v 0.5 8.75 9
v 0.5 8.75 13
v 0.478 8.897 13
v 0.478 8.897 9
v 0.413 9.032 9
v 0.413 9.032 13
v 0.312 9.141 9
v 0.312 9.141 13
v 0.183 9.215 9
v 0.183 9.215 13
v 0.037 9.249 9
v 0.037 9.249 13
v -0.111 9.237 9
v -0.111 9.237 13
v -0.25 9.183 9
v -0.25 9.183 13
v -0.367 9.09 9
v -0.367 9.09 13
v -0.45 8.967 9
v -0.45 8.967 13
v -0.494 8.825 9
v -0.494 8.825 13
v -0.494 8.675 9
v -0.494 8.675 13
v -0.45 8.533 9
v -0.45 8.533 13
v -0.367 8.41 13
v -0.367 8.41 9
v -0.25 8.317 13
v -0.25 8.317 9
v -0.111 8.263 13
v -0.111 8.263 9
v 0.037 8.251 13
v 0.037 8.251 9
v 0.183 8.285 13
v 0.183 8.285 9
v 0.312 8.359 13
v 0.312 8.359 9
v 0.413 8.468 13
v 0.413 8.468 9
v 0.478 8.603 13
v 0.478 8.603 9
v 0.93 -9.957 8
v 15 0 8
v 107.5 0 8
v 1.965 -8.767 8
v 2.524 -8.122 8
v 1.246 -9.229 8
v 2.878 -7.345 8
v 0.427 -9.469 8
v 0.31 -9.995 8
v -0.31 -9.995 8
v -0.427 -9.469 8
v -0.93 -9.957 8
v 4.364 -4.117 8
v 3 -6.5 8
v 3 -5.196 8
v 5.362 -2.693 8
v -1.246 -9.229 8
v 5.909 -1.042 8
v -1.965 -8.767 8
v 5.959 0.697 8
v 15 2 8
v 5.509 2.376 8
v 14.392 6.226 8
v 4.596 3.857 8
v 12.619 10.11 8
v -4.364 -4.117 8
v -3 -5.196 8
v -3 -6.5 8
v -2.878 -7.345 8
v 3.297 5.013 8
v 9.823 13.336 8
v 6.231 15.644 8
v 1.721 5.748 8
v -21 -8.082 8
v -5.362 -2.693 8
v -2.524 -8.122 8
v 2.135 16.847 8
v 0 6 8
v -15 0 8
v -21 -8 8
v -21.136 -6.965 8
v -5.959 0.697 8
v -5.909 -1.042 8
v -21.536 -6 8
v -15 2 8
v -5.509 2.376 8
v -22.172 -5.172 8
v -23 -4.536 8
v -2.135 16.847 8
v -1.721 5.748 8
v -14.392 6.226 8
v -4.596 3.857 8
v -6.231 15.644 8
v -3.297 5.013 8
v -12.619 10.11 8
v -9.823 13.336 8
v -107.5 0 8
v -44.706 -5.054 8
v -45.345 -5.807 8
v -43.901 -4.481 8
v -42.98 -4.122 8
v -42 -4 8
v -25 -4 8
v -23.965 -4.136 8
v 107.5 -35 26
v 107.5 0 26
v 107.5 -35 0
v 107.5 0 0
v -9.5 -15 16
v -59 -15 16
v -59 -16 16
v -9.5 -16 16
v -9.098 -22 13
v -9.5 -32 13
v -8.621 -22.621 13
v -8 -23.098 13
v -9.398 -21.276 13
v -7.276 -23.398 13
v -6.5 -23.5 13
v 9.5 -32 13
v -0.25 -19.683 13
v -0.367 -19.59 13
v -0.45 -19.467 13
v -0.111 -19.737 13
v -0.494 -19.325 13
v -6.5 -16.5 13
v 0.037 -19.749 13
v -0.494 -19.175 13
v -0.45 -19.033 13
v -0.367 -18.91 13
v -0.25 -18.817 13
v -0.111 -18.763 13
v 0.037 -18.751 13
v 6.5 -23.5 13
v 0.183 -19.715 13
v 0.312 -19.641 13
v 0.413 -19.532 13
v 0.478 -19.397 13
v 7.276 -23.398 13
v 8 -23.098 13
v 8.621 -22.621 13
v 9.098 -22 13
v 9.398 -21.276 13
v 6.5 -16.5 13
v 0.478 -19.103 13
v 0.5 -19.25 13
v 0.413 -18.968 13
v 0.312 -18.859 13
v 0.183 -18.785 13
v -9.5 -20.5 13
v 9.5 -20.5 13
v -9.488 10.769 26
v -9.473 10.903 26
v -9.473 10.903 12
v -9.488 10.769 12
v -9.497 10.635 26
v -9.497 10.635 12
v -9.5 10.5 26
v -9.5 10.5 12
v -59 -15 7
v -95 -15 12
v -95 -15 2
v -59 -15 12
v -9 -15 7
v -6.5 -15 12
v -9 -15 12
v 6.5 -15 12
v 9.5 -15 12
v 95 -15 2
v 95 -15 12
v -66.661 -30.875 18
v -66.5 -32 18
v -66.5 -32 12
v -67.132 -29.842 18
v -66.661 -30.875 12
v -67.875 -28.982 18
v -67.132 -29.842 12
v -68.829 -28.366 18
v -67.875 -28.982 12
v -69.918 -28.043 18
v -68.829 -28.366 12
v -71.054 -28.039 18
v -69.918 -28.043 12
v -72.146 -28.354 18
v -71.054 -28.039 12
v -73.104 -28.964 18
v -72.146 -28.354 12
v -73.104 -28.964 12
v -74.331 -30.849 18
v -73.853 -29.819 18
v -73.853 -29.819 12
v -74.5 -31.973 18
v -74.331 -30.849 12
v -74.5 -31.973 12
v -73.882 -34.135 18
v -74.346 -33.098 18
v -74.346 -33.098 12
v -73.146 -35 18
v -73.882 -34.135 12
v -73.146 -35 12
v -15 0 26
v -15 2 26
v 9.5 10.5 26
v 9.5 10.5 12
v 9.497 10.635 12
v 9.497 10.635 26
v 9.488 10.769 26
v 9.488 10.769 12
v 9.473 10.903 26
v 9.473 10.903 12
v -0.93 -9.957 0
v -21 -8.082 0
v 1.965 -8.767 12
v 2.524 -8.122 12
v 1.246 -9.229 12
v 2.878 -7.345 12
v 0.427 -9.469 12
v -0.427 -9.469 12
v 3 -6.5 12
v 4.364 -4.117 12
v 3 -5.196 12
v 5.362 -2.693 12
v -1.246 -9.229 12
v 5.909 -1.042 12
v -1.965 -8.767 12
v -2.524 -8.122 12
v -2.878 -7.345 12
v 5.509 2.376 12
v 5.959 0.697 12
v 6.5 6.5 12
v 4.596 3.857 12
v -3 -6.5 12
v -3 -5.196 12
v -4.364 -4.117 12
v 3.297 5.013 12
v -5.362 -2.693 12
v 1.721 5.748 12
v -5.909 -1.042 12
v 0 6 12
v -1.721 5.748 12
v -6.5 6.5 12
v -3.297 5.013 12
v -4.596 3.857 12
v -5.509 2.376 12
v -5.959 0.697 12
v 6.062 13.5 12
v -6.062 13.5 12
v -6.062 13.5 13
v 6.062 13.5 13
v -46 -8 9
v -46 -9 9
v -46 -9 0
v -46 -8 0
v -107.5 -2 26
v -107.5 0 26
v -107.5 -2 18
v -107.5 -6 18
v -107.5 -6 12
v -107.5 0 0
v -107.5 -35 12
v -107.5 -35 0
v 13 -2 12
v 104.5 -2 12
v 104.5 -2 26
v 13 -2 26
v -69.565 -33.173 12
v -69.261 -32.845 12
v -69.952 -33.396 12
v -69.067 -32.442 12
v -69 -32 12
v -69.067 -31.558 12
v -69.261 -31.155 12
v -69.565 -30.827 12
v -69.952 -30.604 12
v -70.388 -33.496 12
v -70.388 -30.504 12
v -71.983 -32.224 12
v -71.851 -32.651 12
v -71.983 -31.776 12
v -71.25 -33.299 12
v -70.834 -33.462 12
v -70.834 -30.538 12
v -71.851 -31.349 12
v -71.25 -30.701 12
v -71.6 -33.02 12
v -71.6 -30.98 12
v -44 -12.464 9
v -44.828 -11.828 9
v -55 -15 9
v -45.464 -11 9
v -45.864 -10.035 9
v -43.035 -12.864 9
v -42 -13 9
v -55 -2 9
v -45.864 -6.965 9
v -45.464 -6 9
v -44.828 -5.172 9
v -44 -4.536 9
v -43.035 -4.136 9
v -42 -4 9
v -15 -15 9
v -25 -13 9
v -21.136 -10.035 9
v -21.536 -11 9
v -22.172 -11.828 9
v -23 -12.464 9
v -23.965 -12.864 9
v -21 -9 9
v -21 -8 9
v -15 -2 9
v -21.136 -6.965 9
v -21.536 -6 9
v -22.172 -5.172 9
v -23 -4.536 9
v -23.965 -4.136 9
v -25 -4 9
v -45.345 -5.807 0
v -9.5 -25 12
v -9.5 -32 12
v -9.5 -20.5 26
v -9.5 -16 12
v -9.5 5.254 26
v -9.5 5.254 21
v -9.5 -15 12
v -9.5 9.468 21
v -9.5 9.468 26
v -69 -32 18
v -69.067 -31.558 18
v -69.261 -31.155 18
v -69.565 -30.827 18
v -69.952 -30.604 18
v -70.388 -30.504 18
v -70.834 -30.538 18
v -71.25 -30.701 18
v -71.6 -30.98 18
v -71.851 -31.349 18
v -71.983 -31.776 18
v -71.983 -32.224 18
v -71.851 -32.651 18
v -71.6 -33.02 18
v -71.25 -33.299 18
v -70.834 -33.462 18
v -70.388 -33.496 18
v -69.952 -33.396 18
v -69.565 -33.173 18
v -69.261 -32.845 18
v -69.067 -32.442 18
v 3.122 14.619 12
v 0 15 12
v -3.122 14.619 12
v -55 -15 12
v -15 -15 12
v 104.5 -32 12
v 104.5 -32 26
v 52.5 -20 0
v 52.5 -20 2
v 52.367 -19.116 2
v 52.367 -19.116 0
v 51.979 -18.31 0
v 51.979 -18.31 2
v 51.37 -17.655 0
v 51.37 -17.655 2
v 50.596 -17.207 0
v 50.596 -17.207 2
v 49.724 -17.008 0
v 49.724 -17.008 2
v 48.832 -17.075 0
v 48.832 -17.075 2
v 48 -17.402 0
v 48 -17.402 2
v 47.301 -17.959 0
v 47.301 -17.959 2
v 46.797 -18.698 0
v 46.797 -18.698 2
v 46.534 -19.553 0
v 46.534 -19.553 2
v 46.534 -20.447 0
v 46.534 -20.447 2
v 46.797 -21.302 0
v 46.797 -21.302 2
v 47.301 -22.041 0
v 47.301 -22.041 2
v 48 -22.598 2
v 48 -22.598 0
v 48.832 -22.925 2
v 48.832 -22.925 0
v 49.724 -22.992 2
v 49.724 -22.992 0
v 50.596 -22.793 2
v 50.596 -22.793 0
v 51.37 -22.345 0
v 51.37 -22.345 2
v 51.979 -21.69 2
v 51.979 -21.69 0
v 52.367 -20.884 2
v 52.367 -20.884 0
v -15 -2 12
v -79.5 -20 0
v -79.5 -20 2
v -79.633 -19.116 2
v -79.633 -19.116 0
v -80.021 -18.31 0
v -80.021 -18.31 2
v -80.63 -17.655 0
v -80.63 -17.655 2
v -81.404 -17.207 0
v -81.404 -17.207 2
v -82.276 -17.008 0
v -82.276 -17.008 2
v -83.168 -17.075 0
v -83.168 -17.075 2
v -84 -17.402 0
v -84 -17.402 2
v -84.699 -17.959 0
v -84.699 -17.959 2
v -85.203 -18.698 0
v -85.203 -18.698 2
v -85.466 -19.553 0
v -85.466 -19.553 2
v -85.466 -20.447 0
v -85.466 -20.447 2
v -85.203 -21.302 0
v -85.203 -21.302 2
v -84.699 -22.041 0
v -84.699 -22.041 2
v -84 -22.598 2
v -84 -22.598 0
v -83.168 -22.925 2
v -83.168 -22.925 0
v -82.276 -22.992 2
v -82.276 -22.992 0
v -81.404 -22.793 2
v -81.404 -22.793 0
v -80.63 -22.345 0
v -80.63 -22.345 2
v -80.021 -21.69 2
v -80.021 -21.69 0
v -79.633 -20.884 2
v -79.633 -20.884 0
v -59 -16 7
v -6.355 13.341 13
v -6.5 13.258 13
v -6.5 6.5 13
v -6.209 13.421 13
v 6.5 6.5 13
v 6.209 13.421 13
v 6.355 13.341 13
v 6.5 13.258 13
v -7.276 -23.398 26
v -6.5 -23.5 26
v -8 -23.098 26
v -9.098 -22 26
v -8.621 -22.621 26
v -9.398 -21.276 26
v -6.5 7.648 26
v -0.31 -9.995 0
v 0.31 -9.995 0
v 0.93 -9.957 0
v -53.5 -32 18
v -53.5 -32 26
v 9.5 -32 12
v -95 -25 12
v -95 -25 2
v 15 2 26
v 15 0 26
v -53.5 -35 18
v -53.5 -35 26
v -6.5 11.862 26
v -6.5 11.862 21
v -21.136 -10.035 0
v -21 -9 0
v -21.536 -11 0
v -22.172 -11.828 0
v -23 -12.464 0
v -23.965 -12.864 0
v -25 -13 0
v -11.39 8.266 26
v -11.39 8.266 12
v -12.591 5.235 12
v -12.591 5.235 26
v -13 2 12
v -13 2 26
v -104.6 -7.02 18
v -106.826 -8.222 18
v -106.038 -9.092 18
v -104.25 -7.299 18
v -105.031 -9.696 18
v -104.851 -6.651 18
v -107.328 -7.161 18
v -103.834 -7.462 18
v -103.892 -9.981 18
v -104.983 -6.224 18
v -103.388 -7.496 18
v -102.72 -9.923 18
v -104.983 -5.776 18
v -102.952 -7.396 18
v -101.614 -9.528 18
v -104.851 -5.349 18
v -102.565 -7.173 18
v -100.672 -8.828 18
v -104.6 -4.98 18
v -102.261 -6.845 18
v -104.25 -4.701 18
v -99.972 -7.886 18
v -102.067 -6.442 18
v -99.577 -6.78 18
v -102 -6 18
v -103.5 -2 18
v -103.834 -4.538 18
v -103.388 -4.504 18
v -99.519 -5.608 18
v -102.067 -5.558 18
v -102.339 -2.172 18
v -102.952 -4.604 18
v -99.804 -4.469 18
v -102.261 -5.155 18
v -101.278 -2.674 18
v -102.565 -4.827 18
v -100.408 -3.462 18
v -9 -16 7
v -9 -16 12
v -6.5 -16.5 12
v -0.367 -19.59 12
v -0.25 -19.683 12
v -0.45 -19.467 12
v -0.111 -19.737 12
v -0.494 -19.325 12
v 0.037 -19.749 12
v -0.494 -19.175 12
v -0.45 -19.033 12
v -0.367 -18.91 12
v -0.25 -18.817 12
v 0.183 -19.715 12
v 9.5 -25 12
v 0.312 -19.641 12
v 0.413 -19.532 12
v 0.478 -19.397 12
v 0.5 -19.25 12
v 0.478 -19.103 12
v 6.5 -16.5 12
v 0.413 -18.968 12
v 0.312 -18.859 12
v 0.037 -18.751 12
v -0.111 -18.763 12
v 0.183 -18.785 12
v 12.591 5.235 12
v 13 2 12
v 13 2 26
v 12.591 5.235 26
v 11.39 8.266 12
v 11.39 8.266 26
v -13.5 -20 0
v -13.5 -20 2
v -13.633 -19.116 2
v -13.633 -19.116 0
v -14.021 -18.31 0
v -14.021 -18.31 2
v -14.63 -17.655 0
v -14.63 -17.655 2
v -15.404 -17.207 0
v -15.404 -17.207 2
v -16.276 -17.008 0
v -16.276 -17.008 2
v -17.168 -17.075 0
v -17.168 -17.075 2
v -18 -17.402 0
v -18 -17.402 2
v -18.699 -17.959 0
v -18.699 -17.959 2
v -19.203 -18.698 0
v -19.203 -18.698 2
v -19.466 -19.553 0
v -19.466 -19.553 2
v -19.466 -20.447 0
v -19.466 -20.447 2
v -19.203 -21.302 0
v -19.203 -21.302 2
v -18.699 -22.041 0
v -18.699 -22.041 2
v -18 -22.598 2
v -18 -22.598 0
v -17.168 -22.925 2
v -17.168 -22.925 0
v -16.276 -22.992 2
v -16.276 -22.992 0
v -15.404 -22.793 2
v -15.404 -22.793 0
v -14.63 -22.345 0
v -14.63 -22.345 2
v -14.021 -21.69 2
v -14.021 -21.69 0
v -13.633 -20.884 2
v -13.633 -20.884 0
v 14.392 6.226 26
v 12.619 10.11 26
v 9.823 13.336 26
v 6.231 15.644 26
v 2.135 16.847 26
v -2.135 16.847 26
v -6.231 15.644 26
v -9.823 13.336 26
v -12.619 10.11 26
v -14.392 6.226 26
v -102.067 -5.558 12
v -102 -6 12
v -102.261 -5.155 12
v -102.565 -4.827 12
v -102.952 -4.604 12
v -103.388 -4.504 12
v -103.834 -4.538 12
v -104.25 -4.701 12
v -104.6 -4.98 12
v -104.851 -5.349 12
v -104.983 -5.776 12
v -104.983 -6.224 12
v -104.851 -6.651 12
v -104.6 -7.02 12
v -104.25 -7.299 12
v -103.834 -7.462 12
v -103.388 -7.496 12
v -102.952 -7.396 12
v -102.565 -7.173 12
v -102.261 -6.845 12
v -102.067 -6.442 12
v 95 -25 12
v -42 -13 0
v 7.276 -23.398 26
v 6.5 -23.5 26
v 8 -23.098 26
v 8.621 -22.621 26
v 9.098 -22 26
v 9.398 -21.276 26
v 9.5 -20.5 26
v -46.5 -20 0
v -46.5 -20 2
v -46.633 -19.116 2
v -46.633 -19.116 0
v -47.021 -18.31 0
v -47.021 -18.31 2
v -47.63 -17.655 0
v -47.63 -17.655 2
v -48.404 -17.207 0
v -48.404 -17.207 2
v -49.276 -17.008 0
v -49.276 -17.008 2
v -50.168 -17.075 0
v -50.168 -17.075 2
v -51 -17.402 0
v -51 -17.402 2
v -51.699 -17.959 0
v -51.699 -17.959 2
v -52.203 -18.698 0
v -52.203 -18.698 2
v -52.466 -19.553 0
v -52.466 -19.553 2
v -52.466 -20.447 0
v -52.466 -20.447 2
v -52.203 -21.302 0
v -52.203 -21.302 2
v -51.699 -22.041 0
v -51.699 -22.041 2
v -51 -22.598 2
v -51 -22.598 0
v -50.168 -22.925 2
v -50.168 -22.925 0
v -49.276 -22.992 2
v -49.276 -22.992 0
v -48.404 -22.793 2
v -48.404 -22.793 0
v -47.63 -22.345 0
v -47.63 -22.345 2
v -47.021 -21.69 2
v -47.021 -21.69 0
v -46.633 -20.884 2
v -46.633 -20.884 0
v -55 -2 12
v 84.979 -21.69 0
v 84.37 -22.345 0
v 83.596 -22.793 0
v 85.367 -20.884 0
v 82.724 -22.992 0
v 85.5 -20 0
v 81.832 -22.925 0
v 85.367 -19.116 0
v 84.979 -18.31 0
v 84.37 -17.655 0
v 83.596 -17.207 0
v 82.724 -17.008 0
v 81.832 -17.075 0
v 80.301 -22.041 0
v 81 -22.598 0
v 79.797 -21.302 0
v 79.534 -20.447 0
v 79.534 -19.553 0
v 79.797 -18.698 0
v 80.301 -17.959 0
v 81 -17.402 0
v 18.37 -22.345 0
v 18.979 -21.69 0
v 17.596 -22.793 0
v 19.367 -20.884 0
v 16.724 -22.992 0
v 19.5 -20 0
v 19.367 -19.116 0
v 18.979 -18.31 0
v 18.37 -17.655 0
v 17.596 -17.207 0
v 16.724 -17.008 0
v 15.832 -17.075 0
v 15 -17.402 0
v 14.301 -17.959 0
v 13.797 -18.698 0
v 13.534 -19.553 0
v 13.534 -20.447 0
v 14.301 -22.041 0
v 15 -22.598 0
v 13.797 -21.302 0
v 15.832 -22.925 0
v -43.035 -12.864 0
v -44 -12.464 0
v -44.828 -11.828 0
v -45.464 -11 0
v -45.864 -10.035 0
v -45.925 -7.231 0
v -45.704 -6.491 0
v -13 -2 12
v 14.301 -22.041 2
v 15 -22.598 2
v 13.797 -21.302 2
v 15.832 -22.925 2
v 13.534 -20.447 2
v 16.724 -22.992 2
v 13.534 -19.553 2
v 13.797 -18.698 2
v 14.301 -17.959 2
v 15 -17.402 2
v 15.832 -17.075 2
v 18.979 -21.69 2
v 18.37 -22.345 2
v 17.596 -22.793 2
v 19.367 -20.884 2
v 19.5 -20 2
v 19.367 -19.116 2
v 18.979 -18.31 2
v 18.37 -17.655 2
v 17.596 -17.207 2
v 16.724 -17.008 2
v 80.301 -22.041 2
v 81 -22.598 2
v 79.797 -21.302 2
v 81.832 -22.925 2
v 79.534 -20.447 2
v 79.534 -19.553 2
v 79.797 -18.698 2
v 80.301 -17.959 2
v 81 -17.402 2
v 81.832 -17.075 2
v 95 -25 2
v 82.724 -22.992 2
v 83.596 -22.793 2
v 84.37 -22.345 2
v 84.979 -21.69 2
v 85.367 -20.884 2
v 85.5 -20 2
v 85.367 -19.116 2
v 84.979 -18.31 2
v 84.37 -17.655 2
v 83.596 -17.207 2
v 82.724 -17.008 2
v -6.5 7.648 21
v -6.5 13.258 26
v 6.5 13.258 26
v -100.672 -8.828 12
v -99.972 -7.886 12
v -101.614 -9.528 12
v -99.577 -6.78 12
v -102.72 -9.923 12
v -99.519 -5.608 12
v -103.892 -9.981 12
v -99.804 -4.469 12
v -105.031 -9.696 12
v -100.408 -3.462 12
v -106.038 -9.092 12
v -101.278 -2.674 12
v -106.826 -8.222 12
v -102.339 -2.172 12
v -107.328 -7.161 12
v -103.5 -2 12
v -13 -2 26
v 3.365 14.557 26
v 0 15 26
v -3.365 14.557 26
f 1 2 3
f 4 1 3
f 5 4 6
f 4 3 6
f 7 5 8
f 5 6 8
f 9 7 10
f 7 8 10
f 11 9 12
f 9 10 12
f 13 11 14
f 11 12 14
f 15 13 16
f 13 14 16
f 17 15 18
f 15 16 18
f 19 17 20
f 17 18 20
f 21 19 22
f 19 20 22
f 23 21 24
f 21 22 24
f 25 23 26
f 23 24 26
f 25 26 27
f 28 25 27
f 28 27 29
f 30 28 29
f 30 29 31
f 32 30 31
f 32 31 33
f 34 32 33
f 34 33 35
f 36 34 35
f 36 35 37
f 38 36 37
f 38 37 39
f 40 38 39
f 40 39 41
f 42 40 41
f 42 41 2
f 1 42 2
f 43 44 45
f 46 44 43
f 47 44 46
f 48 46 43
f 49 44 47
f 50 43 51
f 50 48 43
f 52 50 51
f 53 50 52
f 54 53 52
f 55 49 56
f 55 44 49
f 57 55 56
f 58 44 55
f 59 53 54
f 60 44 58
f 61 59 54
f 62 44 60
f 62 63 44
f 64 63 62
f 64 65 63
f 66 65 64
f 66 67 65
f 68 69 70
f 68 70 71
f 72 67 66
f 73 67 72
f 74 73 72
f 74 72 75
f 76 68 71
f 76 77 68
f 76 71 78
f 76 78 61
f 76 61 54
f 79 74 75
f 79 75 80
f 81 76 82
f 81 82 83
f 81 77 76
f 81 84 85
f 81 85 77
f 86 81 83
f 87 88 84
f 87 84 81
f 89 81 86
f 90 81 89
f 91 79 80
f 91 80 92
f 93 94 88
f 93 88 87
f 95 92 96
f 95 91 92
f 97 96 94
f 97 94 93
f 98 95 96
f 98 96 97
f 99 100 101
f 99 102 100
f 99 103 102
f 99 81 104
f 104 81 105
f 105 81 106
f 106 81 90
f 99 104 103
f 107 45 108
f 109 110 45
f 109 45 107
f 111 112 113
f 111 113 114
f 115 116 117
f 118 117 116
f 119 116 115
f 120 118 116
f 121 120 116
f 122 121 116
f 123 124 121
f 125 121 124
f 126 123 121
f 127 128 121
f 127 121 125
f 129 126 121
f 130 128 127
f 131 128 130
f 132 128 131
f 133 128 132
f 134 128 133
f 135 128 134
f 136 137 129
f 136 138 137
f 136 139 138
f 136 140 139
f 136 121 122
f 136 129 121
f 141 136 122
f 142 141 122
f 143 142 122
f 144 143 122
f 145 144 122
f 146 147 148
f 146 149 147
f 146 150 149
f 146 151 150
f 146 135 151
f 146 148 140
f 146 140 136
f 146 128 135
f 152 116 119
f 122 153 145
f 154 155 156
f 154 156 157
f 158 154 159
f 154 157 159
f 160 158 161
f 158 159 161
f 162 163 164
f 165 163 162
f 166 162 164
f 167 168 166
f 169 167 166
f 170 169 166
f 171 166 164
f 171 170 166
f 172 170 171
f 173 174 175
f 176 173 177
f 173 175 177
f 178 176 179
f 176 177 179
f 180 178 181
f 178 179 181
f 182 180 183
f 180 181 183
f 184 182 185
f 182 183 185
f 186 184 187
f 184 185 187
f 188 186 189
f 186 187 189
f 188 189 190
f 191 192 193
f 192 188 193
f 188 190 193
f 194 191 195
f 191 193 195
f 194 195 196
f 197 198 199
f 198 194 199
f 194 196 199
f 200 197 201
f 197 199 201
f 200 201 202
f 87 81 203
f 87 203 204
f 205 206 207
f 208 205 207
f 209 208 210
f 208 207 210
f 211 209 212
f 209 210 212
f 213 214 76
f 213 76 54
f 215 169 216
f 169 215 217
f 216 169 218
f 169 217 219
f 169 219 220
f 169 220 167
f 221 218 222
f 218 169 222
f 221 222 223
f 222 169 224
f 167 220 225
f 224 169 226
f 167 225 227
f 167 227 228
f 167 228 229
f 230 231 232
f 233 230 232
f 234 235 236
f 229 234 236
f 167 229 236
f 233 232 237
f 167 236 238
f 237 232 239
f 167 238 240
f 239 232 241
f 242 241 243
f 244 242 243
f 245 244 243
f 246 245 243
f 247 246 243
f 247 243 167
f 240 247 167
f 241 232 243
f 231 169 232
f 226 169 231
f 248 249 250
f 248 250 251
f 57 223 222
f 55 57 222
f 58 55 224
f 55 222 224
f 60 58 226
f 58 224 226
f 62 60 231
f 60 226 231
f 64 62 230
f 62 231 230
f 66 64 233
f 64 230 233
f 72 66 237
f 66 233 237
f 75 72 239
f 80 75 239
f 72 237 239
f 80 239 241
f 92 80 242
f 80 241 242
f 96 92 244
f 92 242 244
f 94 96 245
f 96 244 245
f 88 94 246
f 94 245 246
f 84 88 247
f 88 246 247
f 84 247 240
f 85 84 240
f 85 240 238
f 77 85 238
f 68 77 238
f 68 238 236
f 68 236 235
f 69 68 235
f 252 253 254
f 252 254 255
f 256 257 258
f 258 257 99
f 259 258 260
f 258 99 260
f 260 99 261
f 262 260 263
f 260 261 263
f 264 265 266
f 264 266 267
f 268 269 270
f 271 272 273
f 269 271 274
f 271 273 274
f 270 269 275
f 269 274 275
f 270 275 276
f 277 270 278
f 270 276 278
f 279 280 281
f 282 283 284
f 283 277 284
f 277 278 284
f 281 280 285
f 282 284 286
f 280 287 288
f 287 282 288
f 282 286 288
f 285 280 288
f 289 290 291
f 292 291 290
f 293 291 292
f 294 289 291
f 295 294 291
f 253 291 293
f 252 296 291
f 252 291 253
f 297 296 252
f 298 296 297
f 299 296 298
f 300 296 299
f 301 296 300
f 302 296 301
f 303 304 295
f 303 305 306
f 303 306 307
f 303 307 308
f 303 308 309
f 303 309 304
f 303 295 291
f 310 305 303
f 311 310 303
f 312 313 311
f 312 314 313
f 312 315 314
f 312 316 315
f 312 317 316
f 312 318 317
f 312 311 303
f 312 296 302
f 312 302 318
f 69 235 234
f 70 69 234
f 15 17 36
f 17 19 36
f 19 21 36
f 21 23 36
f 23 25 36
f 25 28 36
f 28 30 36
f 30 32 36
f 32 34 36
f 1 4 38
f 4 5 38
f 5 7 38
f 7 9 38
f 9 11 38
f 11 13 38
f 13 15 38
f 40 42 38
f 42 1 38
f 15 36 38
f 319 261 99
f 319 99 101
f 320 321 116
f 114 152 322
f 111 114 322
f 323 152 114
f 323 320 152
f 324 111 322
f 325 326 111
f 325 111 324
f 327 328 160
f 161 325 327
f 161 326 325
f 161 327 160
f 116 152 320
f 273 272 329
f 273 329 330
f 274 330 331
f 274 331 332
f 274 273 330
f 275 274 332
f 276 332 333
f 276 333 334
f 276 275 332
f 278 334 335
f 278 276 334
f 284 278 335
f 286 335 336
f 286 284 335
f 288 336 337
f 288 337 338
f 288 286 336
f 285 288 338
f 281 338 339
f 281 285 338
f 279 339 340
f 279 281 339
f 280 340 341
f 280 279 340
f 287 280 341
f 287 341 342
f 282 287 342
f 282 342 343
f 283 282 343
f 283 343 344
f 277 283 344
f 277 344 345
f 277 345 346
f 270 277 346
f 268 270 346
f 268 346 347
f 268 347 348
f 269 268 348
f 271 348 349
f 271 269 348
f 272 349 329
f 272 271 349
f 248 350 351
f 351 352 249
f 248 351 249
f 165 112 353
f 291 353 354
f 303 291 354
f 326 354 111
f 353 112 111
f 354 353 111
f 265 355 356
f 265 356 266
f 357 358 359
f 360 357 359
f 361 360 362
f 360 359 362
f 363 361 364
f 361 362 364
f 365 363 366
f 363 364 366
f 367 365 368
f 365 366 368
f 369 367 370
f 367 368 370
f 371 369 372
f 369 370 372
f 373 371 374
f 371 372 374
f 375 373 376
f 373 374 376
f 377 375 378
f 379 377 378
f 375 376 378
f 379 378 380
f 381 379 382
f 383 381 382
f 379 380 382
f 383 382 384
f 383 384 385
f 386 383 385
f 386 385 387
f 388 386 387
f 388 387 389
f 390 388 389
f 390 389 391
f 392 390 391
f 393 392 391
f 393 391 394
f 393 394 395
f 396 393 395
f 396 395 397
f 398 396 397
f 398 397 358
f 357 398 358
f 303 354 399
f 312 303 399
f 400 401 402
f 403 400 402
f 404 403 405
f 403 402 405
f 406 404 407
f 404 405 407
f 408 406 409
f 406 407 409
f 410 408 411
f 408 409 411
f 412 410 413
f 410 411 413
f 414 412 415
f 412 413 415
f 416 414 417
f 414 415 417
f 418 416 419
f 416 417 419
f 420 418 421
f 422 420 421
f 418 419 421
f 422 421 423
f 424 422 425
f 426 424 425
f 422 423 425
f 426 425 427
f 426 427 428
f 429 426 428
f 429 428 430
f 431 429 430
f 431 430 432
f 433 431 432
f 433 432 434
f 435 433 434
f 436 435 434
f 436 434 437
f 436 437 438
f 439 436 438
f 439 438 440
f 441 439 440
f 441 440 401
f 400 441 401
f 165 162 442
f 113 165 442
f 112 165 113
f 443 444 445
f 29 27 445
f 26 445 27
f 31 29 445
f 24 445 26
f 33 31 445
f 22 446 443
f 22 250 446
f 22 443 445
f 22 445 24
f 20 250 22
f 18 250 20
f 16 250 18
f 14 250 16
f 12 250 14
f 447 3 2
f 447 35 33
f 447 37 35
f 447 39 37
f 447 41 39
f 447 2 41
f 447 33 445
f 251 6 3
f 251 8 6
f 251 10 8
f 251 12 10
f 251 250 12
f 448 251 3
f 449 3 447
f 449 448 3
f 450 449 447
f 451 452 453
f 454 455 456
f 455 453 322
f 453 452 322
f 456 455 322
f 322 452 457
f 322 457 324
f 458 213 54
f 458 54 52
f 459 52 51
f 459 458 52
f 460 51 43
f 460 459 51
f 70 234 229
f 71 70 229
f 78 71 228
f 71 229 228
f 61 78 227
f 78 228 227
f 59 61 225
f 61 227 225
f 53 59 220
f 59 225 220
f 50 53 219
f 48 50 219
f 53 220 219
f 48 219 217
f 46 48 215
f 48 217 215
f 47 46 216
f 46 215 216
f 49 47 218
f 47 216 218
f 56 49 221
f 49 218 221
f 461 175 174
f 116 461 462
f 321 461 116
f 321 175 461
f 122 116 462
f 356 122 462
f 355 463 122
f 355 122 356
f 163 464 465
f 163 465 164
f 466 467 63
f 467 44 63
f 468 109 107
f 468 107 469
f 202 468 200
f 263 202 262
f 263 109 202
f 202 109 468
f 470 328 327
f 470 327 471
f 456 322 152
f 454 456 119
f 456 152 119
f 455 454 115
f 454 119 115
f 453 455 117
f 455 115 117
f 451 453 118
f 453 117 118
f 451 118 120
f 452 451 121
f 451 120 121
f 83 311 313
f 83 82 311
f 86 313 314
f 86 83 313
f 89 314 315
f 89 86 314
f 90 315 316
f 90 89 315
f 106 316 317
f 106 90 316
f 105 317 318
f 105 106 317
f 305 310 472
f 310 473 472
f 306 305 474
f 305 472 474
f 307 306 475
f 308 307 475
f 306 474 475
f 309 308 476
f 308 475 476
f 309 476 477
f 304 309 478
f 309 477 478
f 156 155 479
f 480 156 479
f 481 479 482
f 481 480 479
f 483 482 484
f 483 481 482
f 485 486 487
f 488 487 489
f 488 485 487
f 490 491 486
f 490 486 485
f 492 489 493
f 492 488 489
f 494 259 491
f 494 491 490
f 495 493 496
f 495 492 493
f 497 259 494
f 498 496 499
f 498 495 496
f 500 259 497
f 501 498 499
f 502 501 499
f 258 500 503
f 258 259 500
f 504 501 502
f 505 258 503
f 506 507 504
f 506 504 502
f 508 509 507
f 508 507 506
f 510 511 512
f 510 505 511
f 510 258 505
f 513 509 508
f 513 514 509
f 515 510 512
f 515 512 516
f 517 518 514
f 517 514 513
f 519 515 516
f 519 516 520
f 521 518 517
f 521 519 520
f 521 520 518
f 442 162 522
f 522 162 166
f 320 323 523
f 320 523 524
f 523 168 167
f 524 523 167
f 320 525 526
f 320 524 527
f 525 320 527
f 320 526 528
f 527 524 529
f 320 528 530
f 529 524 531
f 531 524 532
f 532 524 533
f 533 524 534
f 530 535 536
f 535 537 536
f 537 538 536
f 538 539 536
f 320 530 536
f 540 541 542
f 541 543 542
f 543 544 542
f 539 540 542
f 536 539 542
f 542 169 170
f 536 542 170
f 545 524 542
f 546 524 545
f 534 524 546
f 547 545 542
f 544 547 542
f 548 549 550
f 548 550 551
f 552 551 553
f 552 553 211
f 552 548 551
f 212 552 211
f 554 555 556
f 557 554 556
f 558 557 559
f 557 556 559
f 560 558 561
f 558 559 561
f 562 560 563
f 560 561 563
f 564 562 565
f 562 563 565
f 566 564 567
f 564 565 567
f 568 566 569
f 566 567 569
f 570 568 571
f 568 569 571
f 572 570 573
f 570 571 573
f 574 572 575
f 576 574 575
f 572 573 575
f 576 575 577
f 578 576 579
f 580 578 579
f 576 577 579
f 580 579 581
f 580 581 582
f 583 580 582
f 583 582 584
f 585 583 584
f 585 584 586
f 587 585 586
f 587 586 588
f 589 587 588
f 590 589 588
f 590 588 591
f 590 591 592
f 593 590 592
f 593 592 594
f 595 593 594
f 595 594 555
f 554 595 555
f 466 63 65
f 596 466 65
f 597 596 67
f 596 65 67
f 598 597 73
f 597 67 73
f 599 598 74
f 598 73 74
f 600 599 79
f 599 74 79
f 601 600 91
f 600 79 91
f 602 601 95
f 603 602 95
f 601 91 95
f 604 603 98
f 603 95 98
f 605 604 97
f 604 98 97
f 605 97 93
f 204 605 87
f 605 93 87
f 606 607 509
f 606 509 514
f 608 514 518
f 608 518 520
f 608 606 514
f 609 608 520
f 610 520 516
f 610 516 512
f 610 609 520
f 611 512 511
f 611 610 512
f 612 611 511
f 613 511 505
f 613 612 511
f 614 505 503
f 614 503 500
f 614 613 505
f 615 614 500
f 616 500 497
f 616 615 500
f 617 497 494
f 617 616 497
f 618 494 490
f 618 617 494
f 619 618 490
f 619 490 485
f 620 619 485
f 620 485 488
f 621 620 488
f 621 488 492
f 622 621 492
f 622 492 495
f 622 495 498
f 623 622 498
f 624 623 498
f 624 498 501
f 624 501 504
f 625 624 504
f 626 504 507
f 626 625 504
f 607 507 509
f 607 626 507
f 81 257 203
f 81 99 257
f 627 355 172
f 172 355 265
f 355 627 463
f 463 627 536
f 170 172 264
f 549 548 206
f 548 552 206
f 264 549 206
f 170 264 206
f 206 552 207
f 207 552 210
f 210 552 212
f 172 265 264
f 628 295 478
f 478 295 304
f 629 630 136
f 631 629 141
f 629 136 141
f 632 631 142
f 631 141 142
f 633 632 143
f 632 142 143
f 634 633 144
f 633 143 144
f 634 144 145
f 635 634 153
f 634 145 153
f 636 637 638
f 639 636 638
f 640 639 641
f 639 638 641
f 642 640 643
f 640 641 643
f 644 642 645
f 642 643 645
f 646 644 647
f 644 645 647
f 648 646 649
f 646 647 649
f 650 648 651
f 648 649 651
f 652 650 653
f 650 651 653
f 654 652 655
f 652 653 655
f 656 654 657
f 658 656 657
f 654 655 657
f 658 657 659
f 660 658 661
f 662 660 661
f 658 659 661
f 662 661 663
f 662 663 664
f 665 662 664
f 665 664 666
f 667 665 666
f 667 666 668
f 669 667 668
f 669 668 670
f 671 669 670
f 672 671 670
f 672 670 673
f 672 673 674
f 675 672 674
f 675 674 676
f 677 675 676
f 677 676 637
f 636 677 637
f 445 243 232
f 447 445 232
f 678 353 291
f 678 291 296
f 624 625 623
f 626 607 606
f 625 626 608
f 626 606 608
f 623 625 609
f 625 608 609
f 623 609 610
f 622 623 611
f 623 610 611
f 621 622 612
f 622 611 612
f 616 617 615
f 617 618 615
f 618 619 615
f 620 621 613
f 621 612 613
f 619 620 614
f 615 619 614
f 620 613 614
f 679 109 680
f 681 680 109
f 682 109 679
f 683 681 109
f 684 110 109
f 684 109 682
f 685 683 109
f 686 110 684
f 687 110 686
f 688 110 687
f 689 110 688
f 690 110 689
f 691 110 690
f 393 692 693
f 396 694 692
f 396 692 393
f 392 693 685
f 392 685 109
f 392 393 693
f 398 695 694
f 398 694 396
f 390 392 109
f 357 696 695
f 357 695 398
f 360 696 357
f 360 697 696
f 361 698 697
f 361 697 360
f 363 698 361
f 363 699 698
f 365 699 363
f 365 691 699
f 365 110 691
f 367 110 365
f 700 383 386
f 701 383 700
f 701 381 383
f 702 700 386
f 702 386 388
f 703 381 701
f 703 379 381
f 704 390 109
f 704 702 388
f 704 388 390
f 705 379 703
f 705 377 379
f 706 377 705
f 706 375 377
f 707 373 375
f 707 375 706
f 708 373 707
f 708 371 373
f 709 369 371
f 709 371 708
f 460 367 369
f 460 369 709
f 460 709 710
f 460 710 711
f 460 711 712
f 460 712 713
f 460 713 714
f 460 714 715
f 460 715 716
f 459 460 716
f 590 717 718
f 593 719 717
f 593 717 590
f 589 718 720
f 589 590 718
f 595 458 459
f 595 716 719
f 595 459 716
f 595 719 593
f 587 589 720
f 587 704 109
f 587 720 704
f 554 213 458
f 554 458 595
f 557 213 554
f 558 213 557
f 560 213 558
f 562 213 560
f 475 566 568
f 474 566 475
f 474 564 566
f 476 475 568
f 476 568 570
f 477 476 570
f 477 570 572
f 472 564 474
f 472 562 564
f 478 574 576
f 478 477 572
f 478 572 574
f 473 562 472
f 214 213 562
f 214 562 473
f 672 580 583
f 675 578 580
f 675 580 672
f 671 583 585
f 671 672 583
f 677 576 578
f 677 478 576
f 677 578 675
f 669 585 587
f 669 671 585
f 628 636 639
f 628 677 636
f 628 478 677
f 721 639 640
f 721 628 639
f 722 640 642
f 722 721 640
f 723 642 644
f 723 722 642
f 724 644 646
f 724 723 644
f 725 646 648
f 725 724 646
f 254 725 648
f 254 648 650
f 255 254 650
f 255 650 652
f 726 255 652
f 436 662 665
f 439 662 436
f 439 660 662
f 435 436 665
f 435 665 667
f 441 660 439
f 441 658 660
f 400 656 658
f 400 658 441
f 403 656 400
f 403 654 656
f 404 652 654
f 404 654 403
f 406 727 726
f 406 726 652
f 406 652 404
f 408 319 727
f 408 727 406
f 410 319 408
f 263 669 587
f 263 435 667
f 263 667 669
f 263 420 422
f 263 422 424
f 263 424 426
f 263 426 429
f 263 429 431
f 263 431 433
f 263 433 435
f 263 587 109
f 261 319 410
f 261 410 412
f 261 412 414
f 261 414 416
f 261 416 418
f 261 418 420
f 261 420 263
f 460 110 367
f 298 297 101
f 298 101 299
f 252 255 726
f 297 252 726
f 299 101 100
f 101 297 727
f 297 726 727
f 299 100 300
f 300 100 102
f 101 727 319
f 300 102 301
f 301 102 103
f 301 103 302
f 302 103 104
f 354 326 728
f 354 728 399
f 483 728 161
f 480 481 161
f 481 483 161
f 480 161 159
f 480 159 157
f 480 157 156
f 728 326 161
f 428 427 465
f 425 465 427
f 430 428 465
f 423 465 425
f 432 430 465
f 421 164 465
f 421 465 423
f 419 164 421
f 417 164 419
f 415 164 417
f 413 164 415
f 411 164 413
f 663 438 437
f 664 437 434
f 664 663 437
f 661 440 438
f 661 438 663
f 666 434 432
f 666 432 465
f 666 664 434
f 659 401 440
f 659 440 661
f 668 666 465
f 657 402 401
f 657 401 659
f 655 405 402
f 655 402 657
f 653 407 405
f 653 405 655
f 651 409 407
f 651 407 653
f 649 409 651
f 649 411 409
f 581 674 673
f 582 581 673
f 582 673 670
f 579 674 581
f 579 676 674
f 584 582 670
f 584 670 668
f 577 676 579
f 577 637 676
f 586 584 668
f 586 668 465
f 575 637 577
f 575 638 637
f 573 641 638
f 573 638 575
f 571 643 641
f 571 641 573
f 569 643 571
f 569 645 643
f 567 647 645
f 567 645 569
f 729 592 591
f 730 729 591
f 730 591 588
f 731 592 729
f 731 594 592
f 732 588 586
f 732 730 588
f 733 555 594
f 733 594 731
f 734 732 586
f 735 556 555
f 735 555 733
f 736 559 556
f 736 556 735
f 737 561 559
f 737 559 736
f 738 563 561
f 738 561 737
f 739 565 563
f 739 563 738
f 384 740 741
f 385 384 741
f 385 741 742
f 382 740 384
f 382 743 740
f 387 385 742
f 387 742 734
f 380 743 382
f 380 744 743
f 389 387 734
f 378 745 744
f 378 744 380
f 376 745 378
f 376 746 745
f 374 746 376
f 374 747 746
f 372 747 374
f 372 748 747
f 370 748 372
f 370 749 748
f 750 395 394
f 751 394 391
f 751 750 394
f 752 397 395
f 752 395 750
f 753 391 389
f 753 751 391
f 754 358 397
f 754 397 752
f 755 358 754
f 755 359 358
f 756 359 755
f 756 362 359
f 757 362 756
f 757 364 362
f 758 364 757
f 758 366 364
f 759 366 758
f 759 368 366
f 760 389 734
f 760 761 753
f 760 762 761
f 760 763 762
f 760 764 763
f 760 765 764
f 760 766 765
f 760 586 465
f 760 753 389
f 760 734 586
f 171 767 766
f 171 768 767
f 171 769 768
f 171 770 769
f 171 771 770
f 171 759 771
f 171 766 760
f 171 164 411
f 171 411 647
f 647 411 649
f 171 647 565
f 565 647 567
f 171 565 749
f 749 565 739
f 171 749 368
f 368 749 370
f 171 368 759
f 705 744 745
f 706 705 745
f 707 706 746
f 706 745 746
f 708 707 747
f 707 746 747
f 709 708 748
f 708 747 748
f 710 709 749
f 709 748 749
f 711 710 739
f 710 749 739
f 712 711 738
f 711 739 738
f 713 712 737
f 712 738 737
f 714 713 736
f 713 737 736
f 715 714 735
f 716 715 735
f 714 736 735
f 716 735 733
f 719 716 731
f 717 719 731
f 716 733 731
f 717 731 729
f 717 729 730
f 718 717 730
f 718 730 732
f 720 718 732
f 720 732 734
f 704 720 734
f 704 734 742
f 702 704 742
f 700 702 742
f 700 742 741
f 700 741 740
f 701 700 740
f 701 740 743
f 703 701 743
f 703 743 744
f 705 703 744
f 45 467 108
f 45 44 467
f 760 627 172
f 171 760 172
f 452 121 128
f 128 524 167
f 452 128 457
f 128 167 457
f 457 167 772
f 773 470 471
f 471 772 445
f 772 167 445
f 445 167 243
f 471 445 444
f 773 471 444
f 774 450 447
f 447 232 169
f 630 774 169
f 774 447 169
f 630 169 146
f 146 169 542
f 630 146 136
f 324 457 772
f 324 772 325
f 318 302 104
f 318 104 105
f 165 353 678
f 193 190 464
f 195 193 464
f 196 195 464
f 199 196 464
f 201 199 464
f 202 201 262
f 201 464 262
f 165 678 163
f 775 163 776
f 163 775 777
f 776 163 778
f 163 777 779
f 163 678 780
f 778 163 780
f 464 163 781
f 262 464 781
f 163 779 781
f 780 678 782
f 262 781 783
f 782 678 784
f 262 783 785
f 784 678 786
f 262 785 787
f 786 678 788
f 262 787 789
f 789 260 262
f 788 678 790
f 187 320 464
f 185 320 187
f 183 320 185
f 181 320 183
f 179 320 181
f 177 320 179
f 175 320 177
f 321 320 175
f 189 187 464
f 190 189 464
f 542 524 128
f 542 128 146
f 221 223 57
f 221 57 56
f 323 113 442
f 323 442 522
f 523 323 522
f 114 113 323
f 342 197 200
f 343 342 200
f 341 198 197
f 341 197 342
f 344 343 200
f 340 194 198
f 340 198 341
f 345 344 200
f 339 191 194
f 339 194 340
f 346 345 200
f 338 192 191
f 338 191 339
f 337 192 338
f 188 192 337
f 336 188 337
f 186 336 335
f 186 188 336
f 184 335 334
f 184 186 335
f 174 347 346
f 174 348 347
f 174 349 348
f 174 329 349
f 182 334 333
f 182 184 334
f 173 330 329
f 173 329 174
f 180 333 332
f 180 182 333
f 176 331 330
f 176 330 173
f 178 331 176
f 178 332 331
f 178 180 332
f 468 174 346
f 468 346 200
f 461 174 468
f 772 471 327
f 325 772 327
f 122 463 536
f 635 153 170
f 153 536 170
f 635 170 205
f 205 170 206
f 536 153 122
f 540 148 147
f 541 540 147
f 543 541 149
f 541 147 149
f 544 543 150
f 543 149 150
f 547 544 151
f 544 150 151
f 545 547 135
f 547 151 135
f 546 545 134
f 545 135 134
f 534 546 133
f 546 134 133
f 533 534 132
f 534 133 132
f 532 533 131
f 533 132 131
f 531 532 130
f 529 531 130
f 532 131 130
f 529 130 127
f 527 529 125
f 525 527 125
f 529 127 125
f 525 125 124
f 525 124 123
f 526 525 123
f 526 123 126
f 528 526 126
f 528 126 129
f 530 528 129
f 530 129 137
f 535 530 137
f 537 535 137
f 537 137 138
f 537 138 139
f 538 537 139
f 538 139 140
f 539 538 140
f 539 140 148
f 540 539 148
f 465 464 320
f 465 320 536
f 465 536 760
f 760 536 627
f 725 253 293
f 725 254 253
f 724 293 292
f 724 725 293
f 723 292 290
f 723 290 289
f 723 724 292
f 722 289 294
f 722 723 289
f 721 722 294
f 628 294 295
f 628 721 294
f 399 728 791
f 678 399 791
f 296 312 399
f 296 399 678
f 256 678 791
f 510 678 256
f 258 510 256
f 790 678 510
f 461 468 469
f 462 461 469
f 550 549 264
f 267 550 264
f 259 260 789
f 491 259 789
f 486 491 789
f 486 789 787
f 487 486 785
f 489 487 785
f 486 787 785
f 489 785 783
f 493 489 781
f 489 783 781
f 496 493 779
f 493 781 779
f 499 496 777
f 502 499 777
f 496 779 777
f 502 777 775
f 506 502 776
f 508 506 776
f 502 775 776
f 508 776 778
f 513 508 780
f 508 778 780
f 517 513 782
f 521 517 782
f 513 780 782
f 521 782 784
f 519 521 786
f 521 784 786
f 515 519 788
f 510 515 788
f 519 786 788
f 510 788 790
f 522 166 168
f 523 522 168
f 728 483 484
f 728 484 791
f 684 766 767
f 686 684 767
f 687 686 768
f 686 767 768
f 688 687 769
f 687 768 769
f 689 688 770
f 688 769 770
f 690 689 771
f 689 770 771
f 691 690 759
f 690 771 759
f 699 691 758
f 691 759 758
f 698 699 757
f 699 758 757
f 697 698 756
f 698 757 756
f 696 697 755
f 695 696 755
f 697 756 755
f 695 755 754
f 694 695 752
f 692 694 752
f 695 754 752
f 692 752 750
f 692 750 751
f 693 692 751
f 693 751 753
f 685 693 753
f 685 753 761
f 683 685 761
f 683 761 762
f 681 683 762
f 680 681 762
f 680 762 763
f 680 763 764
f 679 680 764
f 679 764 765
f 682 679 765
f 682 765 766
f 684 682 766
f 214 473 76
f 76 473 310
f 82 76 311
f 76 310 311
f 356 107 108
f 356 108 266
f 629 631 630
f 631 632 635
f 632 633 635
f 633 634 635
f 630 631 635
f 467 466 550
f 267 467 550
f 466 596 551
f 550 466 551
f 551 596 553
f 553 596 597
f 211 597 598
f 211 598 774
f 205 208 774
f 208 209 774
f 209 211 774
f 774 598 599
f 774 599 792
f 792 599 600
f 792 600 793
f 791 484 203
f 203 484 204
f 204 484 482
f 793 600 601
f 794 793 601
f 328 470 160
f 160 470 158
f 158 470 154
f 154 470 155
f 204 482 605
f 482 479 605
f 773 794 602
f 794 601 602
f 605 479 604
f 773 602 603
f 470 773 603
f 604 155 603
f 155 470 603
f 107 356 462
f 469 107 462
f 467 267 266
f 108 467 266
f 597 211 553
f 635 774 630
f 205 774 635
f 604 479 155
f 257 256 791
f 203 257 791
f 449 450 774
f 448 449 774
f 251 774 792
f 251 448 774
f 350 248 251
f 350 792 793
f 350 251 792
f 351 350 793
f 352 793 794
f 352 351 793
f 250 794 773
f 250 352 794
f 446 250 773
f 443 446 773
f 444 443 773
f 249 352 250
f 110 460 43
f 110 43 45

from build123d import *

# Parameters (mm, degrees)
PAD_DEPTH       = 8
PAD001_DEPTH    = 4
POCKET_DEPTH    = 5
SKETCH003_W     = 13
SKETCH003_H     = 7
PAD002_DEPTH    = 1
SKETCH004_R     = 0.5
POCKET001_DEPTH = 13.001
PAD003_DEPTH    = 14
PAD004_DEPTH    = 14
SKETCH007_R     = 1.5
PAD005_DEPTH    = 6
POCKET002_DEPTH = 5
SKETCH009_R     = 3
POCKET003_DEPTH = 15
SKETCH010_W     = 190
SKETCH010_H     = 10
POCKET004_DEPTH = 10
SKETCH011_W     = 40
SKETCH011_H     = 13
POCKET005_DEPTH = 3
PAD006_DEPTH    = 14
SKETCH014_W     = 25
SKETCH014_H     = 9
POCKET006_DEPTH = 15
SKETCH015_W     = 19.00002
SKETCH015_H     = 12
PAD007_DEPTH    = 1
SKETCH016_W     = 50
SKETCH016_H     = 9
PAD008_DEPTH    = 1
SKETCH017_W     = 3.141787
SKETCH017_H     = 1.901607
PAD009_DEPTH    = 2
SKETCH018_W     = 15
SKETCH018_H     = 8
POCKET007_DEPTH = 5
SKETCH019_W     = 4.140358
SKETCH019_H     = 3.938392
PAD010_DEPTH    = 1
FILLET_R        = 4


with BuildPart() as part:
    # Sketch → Pad (new body)
    with BuildSketch(Plane.XY):
        with BuildLine():
            Line((107.5, 0), (107.5, -35))
            Line((107.5, -35), (-107.5, -35))
            Line((-107.5, -35), (-107.5, 0))
            Line((-107.5, 0), (-0.930233, -9.956639))
            ThreePointArc((-0.930233, -9.956639), (0, -10), (0.930233, -9.956639))
            Line((0.930233, -9.956639), (107.5, 0))
        make_face()
    extrude(amount=PAD_DEPTH)

    # Sketch001 (on Face8 of Pad) → Pad001 (join)
    with BuildSketch(Plane.XY.offset(8)):
        with BuildLine():
            Line((107.5, 0), (107.5, -35))
            Line((107.5, -35), (-107.5, -35))
            Line((-107.5, -35), (-107.5, 0))
            Line((-107.5, 0), (-15, 0))
            Line((-15, 0), (-15, 2))
            ThreePointArc((15, 2), (0, 17), (-15, 2))
            Line((15, 2), (15, 0))
            Line((15, 0), (107.5, 0))
        make_face()
    extrude(amount=PAD001_DEPTH)

    # Sketch002 (on Face12 of Pad001) → Pocket (cut)
    with BuildSketch(Plane.XY.offset(12)):
        with BuildLine():
            ThreePointArc((3, -5.196152), (0, 6), (-3, -5.196152))
            Line((-3, -5.196152), (-3, -6.5))
            ThreePointArc((-3, -6.5), (0, -9.5), (3, -6.5))
            Line((3, -5.196152), (3, -6.5))
        make_face()
    extrude(amount=-POCKET_DEPTH, mode=Mode.SUBTRACT)

    # Sketch003 (on Face12 of Pocket) → Pad002 (join)
    with BuildSketch(Plane.XY.offset(12)):
        with Locations((0, 10)):
            Rectangle(SKETCH003_W, SKETCH003_H)
        with Locations((0, -20)):
            Rectangle(SKETCH003_W, SKETCH003_H)
    extrude(amount=PAD002_DEPTH)

    # Sketch004 (on Face31 of Pad002) → Pocket001 (cut, through all)
    with BuildSketch(Plane.XY.offset(13)):
        with Locations((0, 8.75)):
            Circle(SKETCH004_R)
        with Locations((0, -19.25)):
            Circle(SKETCH004_R)
    extrude(amount=-POCKET001_DEPTH, mode=Mode.SUBTRACT)

    # Sketch005 (on Face13 of Pocket001) → Pad003 (join)
    with BuildSketch(Plane.XY.offset(12)):
        with BuildLine():
            ThreePointArc((-6.5, 13.5), (-8.621333, 12.621327), (-9.50002, 10.5))
            Line((-9.50002, 10.5), (-9.50002, -20.5))
            ThreePointArc((-9.50002, -20.5), (-8.621333, -22.621327), (-6.5, -23.5))
            Line((-6.5, -23.5), (-6.5, 13.5))
        make_face()
        with BuildLine():
            ThreePointArc((6.5, -23.5), (8.62132, -22.62132), (9.5, -20.5))
            Line((9.5, 10.5), (9.5, -20.5))
            ThreePointArc((9.5, 10.5), (8.62132, 12.62132), (6.5, 13.5))
            Line((6.5, 13.5), (6.5, -23.5))
        make_face()
    extrude(amount=PAD003_DEPTH)

    # Sketch006 (on Face13 of Pad003) → Pad004 (join)
    with BuildSketch(Plane.XY.offset(12)):
        with BuildLine():
            Line((-107.5, 0), (-15, 0))
            Line((-15, 0), (-15, 2))
            ThreePointArc((15, 2), (0, 17), (-15, 2))
            Line((15, 0), (15, 2))
            Line((15, 0), (107.5, 0))
            Line((107.5, 0), (107.5, -2))
            Line((107.5, -2), (13, -2))
            Line((13, 2), (13, -2))
            ThreePointArc((13, 2), (0, 15), (-13, 2))
            Line((-13, 2), (-13, -2))
            Line((-13, -2), (-107.5, -2))
            Line((-107.5, -2), (-107.5, 0))
        make_face()
    extrude(amount=PAD004_DEPTH)

    # Sketch007 (on Face14 of Pad004) → Pad005 (join)
    with BuildSketch(Plane.XY.offset(12)):
        with BuildLine():
            ThreePointArc((-107.5, -5.999985), (-100.671578, -8.828432), (-103.5, -2))
            Line((-103.5, -2), (-107.5, -2))
            Line((-107.5, -2), (-107.5, -5.999985))
        make_face()
        with Locations((-103.5, -6)):
            Circle(SKETCH007_R, mode=Mode.SUBTRACT)
        with BuildLine():
            ThreePointArc((-67.854249, -35), (-70.5, -28), (-73.145751, -35))
            Line((-73.145751, -35), (-67.854249, -35))
        make_face()
        with Locations((-70.5, -32)):
            Circle(SKETCH007_R, mode=Mode.SUBTRACT)
    extrude(amount=PAD005_DEPTH)

    # Sketch008 (on Face60 of Pad005) → Pocket002 (cut)
    with BuildSketch(Plane.XY.offset(26)):
        Polygon((-10.113396, 8.978042), (-5.598833, 12.580972), (-5.598833, 8.367229), (-10.113396, 4.764299), align=None)
    extrude(amount=-POCKET002_DEPTH, mode=Mode.SUBTRACT)

    # Sketch009 (on Face14 of Pocket002) → Pocket003 (cut)
    with BuildSketch(Plane.XY.offset(12)):
        with Locations((-82.5, -20)):
            Circle(SKETCH009_R)
        with Locations((-49.5, -20)):
            Circle(SKETCH009_R)
        with Locations((-16.5, -20)):
            Circle(SKETCH009_R)
        with Locations((16.5, -20)):
            Circle(SKETCH009_R)
        with Locations((49.5, -20)):
            Circle(SKETCH009_R)
        with Locations((82.5, -20)):
            Circle(SKETCH009_R)
    extrude(amount=-POCKET003_DEPTH, mode=Mode.SUBTRACT)

    # Sketch010 (on Face20 of Pocket003) → Pocket004 (cut)
    with BuildSketch(Plane.XY.offset(12)):
        with Locations((0, -20)):
            Rectangle(SKETCH010_W, SKETCH010_H)
    extrude(amount=-POCKET004_DEPTH, mode=Mode.SUBTRACT)

    # Sketch011 (on Face20 of Pocket004) → Pocket005 (cut)
    with BuildSketch(Plane.XY.offset(12)):
        with Locations((-35, -8.5)):
            Rectangle(SKETCH011_W, SKETCH011_H)
    extrude(amount=-POCKET005_DEPTH, mode=Mode.SUBTRACT)

    # Sketch013 → Pad006 (join)
    with BuildSketch(Plane.XY.offset(12)):
        Polygon((104.5, -2), (107.5, -2), (107.5, -35), (-68.5, -35), (-68.5, -32), (104.5, -32), align=None)
    extrude(amount=PAD006_DEPTH)

    # Sketch014 (on Face20 of Pocket005) → Pocket006 (cut)
    with BuildSketch(Plane.XY.offset(12)):
        with Locations((-33.5, -8.5)):
            Rectangle(SKETCH014_W, SKETCH014_H)
    extrude(amount=-POCKET006_DEPTH, mode=Mode.SUBTRACT)

    # Sketch015 → Pad007 (join)
    with BuildSketch(Plane.XY.offset(12)):
        with Locations((-1e-05, -26.5)):
            Rectangle(SKETCH015_W, SKETCH015_H)
    extrude(amount=PAD007_DEPTH)

    # Sketch016 → Pad008 (join)
    with BuildSketch(Plane.XZ.offset(15)):
        with Locations((-34, 11.5)):
            Rectangle(SKETCH016_W, SKETCH016_H)
    extrude(amount=PAD008_DEPTH)

    # Sketch017 → Pad009 (join)
    with BuildSketch(Plane.XY):
        with Locations((0.426476, -19.263597)):
            Rectangle(SKETCH017_W, SKETCH017_H)
    extrude(amount=PAD009_DEPTH)

    # Sketch018 (on Face36 of Pad009) → Pocket007 (cut)
    with BuildSketch(Plane.XZ.offset(35)):
        with Locations((-61, 22)):
            Rectangle(SKETCH018_W, SKETCH018_H)
    extrude(amount=-POCKET007_DEPTH, mode=Mode.SUBTRACT)

    # Sketch019 (on Face7 of Pocket007) → Pad010 (join)
    with BuildSketch(Plane(origin=(0, 0, 8), x_dir=(1, 0, 0), z_dir=(0, 0, -1))):
        with Locations((0.364777, -8.489882)):
            Rectangle(SKETCH019_W, SKETCH019_H)
    extrude(amount=-PAD010_DEPTH)

    # Fillet
    fillet_edges = [part.edges().sort_by_distance(p)[0] for p in [
        (-46, -13, 4.5),
        (-21, -13, 4.5),
        (-21, -4, 8.5),
        (-46, -4, 8.5),
    ]]
    fillet(fillet_edges, radius=FILLET_R)


solid = part.part
